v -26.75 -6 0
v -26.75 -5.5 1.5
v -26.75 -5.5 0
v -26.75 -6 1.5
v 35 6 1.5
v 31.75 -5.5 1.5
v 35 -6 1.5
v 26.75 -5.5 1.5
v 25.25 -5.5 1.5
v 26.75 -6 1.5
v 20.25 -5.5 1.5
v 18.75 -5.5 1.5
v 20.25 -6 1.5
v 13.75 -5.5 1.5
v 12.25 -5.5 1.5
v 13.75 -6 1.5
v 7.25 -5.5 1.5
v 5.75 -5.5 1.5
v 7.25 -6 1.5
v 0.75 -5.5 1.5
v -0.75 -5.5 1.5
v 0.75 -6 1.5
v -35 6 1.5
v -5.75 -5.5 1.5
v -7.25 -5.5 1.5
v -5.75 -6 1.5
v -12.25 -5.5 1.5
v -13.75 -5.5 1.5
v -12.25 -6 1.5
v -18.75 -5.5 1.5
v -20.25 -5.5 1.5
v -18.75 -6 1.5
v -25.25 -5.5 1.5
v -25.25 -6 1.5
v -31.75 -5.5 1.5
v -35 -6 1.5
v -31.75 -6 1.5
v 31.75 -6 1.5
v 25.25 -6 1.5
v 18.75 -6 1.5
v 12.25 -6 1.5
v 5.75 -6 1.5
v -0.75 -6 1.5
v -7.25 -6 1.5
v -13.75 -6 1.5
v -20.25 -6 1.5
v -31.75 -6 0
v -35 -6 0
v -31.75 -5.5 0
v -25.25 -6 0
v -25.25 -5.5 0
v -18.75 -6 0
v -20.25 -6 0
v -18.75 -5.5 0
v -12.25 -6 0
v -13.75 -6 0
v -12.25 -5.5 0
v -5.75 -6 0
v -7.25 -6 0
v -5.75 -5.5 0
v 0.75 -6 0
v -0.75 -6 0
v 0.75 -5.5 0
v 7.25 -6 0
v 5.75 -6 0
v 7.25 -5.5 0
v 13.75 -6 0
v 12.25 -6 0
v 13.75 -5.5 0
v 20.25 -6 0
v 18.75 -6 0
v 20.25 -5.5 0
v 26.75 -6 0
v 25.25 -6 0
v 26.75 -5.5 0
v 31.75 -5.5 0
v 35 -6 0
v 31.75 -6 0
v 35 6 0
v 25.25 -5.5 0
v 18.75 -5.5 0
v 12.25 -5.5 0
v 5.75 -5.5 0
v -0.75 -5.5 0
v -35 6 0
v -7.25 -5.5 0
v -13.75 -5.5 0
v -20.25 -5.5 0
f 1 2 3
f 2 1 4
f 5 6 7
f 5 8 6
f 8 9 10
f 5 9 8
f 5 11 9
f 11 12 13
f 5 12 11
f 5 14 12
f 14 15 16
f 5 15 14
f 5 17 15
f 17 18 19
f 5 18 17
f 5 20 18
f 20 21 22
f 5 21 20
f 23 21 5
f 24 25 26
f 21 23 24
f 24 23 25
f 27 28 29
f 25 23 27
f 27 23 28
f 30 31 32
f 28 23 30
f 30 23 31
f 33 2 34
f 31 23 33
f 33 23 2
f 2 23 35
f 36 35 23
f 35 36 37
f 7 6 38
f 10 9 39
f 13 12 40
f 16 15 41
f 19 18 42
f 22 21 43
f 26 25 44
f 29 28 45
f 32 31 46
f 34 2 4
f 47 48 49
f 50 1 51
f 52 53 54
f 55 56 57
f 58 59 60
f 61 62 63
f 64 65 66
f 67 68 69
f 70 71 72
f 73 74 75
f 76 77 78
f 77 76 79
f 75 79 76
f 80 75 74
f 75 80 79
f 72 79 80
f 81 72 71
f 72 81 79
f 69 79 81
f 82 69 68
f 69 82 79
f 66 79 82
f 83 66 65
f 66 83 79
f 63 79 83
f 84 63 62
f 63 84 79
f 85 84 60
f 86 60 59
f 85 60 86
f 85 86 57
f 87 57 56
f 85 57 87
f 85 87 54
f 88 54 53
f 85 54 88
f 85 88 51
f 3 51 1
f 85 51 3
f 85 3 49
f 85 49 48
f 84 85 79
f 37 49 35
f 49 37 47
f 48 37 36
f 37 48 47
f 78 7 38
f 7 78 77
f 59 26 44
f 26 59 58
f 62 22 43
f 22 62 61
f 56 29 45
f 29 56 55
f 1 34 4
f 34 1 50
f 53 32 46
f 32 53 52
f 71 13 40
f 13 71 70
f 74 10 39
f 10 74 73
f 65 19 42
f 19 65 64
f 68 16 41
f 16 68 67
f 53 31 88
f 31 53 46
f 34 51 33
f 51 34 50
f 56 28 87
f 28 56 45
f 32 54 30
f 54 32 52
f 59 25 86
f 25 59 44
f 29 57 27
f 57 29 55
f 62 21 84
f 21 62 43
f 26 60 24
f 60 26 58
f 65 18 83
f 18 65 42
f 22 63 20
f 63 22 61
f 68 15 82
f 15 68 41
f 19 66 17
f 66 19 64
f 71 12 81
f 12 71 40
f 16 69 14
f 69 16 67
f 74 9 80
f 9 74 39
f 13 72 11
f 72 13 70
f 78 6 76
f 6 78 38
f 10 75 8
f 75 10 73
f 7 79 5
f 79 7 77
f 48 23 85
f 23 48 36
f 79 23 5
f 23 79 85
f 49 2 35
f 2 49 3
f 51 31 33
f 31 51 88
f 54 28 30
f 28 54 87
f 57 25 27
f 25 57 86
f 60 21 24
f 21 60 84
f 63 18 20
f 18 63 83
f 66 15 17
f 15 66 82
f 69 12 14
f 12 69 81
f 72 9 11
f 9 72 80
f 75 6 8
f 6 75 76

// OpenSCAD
// 10-well agarose gel comb, printed lying flat
// Units: mm

$fn = 64;

// ---- Spine (back bar) ----
spine_len   = 70;   // spine length along X
spine_wid   = 12;   // spine width along Y
plate_thk   = 1.5;  // plate thickness along Z

// ---- Teeth ----
tooth_count = 10;   // number of wells
tooth_w     = 5.0;  // tooth width along X
tooth_l     = 12;   // tooth length along Y (overlaps spine)
gap         = 1.5;  // centre-to-centre spacing of teeth

// ---- Derived ----
pitch = tooth_w + gap;  // centre-to-centre tooth spacing
x0    = -(tooth_count - 1) * pitch / 2;  // first tooth X so row is centred
eps   = 0.5;  // cutter overshoot past faces

difference() {
    // Base plate: spine + teeth
    union() {
        translate([-spine_len / 2, -spine_wid / 2, 0])
            cube([spine_len, spine_wid, plate_thk]);
        for (i = [0 : tooth_count - 1])
            translate([x0 + i * pitch - tooth_w / 2,
                       -spine_wid / 2 - tooth_l, 0])
                cube([tooth_w, tooth_l, plate_thk]);
    }

    // Wells: cut through the teeth (and into the spine)
    for (i = [0 : tooth_count - 1])
        translate([x0 + i * pitch - tooth_w / 2,
                   -spine_wid / 2 - tooth_l - eps, 0])
            cube([tooth_w, tooth_l + 2 * eps, plate_thk + 2 * eps]);
}
